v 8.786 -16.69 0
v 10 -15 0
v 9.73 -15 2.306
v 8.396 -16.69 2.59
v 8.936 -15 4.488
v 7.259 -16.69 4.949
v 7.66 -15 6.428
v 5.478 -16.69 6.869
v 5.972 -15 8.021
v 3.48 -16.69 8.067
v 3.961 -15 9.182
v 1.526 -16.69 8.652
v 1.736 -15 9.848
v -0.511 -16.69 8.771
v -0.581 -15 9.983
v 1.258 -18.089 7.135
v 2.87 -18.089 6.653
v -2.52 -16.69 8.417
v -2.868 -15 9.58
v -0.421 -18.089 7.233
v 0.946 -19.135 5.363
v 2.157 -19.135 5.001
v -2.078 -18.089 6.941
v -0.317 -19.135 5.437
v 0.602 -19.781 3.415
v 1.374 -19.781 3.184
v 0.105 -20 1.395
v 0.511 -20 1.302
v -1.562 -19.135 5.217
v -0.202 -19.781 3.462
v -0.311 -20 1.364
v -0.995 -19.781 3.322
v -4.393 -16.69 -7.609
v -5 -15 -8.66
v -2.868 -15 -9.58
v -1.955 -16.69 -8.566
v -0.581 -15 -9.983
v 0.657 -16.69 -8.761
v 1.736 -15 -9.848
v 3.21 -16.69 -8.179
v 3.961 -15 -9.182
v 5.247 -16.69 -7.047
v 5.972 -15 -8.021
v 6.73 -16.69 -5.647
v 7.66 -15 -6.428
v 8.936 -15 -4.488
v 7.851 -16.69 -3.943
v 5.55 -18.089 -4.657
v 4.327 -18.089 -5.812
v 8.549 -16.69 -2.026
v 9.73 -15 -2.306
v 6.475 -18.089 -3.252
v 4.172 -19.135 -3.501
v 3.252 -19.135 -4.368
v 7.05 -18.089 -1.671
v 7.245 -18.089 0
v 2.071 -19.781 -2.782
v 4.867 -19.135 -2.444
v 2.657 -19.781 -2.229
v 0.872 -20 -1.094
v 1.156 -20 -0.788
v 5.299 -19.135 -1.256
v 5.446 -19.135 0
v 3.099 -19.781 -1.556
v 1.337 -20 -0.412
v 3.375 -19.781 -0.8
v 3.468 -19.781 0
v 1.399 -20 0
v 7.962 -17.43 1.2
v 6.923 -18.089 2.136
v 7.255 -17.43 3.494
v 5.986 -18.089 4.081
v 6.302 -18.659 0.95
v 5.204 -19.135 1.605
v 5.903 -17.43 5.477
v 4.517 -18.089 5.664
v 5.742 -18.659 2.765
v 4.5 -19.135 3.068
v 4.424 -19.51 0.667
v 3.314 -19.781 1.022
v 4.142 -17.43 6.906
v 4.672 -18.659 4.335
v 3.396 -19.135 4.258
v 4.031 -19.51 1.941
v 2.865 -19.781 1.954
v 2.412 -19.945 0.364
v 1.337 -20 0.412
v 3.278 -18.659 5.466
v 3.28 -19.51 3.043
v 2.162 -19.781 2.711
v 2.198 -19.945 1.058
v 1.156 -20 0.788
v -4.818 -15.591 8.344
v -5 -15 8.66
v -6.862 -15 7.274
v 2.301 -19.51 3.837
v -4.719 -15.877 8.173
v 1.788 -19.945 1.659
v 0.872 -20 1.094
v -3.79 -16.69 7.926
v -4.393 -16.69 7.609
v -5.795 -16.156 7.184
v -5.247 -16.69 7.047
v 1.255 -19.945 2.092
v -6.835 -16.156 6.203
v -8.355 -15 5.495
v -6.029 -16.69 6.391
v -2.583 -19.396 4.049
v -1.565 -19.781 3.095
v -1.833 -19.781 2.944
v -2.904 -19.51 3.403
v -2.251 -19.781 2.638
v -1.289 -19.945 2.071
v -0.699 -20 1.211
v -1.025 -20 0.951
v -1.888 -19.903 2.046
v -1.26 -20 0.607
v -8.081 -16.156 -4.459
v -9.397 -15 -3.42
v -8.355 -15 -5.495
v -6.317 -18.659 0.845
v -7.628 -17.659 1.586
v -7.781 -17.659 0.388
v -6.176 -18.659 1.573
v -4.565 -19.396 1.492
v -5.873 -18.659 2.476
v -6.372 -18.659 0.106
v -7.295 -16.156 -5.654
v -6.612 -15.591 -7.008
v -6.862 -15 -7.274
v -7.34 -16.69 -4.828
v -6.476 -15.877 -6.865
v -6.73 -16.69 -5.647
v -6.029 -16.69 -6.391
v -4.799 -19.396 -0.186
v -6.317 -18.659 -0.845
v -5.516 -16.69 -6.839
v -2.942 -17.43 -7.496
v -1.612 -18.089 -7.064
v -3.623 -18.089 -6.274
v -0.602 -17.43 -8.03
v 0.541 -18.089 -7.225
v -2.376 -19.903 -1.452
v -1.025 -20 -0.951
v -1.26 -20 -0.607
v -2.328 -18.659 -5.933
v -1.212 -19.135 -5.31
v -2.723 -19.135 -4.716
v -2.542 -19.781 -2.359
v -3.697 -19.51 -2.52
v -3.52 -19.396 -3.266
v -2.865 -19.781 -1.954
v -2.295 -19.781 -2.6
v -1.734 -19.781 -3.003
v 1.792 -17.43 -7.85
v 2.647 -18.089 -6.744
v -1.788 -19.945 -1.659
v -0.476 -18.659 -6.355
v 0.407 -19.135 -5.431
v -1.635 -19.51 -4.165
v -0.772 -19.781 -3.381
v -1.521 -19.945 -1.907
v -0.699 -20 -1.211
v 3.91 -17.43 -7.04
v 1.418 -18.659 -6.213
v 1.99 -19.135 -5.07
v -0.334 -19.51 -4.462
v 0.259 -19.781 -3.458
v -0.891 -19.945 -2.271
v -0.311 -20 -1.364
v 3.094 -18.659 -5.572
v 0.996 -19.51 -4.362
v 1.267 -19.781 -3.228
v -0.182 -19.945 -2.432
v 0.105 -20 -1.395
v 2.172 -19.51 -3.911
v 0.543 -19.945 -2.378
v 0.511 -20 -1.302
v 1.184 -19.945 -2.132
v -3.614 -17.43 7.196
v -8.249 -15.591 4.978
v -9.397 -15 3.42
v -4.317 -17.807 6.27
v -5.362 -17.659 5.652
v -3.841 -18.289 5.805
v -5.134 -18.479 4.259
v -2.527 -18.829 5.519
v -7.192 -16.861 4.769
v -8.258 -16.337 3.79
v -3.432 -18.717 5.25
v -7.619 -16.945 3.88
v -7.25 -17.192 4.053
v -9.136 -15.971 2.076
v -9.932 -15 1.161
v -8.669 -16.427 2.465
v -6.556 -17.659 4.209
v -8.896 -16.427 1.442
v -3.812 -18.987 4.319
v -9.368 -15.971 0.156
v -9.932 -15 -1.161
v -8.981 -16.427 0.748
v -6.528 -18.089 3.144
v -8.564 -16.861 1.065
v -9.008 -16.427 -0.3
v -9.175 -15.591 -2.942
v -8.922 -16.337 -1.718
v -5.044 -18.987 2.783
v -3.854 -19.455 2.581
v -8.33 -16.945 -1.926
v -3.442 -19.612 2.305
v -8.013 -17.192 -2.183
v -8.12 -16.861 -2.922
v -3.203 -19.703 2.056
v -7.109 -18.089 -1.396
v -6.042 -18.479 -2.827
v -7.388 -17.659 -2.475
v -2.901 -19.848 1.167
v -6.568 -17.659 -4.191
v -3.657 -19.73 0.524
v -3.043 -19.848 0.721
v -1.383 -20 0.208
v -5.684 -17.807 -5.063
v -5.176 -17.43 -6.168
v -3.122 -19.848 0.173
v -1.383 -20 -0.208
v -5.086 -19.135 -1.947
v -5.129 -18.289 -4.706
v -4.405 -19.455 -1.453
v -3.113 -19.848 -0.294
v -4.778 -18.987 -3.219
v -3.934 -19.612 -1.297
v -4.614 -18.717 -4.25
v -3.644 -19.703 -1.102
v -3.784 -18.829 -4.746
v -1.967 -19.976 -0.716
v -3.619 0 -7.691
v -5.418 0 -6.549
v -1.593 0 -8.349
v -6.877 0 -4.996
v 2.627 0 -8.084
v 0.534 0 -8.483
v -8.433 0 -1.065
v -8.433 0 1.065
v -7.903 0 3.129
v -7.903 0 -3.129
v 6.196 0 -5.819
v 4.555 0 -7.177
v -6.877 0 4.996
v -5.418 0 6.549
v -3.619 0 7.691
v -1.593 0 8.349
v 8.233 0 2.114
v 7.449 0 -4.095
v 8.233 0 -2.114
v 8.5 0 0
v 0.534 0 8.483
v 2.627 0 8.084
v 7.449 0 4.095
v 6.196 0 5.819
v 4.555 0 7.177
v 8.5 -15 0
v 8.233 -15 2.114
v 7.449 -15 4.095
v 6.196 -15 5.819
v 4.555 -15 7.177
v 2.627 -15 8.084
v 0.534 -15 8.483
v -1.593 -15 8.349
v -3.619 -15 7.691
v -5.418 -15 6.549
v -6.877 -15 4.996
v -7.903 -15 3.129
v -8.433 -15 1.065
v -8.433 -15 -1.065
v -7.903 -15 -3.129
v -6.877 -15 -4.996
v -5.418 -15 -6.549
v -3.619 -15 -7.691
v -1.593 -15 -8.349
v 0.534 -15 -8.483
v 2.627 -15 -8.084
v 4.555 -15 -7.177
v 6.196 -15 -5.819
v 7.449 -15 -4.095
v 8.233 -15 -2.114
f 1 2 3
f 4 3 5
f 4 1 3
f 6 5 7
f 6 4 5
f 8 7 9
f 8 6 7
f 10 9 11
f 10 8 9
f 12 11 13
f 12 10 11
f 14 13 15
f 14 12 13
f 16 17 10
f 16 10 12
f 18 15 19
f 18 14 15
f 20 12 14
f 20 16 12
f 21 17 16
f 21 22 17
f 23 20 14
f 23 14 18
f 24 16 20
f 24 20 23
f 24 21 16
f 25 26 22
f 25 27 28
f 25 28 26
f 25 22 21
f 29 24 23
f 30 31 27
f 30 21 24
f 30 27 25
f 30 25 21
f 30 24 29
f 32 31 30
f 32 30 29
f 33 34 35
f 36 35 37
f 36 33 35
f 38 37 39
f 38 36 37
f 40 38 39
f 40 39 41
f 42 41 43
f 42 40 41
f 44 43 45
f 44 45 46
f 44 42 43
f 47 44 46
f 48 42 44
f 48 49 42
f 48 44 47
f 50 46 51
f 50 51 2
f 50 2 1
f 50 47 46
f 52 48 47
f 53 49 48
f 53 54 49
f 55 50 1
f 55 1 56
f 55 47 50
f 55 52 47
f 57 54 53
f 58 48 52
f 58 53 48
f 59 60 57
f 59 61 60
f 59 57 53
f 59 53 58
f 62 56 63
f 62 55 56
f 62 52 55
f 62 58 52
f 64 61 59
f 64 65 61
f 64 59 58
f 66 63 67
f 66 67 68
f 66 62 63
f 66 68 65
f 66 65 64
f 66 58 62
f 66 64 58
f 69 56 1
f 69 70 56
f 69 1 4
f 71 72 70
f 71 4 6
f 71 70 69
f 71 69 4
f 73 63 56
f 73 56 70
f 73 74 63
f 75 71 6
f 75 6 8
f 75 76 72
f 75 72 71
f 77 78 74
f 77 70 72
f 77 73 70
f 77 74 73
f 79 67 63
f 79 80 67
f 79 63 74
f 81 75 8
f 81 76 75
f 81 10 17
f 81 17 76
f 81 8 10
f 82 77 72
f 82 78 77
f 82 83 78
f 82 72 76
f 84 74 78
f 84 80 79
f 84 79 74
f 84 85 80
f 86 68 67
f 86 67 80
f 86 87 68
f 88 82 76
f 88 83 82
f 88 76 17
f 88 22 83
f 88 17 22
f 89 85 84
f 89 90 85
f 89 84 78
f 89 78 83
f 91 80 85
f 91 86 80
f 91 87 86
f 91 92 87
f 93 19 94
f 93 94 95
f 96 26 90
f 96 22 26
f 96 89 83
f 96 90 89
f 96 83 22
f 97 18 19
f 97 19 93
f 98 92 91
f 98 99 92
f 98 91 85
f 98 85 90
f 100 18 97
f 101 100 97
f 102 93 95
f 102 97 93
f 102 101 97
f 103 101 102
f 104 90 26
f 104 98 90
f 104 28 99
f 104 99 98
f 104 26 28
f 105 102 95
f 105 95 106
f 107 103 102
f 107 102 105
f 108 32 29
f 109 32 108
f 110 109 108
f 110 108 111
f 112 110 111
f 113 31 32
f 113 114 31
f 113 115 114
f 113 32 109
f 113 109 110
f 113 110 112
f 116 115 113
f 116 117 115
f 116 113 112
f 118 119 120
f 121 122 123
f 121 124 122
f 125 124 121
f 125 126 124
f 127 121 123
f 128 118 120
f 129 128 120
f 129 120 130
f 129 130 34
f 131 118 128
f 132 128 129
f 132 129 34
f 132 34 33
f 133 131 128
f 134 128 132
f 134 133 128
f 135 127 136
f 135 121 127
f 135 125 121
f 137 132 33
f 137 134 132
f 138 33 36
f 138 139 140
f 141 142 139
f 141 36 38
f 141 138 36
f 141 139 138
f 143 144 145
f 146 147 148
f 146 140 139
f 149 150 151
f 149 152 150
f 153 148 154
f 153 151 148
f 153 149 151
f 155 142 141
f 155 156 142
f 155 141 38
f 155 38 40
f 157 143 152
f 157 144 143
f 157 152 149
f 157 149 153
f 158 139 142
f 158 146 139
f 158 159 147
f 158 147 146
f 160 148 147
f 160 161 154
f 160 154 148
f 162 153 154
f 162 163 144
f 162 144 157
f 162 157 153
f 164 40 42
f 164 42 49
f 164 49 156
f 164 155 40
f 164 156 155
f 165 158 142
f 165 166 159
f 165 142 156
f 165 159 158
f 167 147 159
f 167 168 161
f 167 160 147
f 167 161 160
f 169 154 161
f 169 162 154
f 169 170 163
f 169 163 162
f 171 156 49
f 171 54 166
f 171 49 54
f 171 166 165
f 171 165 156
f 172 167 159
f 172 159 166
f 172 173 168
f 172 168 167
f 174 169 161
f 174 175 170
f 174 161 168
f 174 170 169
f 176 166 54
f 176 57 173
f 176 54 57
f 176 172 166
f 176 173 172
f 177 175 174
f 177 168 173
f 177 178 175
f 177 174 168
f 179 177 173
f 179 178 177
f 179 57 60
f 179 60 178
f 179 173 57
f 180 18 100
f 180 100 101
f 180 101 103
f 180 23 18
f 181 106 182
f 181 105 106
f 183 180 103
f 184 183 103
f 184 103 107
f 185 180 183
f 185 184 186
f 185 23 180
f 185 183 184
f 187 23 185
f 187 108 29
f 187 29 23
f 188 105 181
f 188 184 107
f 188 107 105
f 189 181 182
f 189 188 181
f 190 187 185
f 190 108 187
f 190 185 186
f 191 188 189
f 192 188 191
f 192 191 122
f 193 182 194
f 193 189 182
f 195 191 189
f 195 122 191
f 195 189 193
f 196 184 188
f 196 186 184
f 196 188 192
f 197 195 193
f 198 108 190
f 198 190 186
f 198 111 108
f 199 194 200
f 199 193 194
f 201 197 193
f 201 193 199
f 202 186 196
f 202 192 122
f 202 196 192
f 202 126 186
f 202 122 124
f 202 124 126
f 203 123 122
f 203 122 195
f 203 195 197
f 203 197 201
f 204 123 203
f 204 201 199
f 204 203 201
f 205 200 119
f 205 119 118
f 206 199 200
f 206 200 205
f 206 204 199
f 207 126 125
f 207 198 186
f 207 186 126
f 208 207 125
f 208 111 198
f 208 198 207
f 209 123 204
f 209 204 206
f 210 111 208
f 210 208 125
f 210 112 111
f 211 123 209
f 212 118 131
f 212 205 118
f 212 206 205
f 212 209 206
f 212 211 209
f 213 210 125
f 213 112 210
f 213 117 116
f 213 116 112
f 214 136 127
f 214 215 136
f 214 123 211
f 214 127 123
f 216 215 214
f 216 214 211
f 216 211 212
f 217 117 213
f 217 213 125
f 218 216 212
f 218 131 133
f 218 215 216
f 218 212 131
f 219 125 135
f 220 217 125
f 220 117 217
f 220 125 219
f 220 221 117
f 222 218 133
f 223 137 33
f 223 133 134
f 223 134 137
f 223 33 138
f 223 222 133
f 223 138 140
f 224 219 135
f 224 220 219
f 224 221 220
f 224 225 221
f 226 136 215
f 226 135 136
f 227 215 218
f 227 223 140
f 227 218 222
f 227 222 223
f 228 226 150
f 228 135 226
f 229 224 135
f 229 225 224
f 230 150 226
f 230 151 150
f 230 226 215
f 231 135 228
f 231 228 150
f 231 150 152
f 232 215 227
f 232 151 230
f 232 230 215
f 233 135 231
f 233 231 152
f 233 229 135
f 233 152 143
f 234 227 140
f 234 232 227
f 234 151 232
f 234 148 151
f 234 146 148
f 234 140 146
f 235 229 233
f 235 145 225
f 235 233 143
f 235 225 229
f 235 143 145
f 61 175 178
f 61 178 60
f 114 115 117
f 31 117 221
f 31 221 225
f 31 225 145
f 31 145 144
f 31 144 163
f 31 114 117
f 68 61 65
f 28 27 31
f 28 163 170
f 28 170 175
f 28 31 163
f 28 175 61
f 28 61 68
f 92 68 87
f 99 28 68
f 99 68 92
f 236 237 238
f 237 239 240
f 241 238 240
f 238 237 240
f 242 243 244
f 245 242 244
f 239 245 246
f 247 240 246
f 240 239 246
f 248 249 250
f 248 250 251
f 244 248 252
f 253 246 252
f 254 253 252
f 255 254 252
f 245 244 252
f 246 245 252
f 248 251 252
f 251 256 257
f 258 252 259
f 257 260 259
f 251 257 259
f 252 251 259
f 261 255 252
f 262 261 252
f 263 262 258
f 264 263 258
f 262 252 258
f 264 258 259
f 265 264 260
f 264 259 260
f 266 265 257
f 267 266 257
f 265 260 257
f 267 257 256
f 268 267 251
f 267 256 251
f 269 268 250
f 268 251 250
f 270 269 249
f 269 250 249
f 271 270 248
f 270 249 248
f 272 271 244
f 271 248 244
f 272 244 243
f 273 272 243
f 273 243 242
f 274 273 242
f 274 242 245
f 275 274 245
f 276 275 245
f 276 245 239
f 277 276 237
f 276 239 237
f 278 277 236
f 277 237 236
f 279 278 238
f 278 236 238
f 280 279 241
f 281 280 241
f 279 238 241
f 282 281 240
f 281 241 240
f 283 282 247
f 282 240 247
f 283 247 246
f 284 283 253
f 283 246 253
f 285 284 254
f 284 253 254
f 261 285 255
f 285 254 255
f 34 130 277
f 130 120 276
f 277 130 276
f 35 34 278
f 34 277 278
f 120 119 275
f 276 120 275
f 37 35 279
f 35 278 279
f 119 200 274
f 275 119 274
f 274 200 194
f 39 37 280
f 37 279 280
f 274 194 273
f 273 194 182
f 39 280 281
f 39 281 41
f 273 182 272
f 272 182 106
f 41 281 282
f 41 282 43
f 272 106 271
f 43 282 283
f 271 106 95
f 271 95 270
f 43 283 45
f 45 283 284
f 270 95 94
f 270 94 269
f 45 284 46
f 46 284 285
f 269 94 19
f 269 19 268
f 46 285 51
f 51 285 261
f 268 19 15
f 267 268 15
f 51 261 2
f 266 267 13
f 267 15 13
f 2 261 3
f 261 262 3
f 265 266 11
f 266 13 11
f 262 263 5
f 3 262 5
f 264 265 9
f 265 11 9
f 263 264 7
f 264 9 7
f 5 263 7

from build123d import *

# Parameters (mm, degrees)
F0_R     = 8.5
F1_DEPTH = 15
F2_R     = 10
F3_DEPTH = 5


# Not quite as in the source:
# - a fillet or chamfer that OpenCascade refuses, or shapes differently, is made with other operations: its cross-section is extruded or revolved along the edge and cut away or added


with BuildPart() as f1:
    # F0 (on Front) → F1 (new body)
    with BuildSketch(Plane.XZ):
        Circle(F0_R)
    extrude(amount=F1_DEPTH)

    # F2 (on face) → F3 (join)
    with BuildSketch(Plane.XZ.offset(15)):
        Circle(F2_R)
    extrude(amount=F3_DEPTH)

    # F4: fillet of radius 9.8982756057 on 1 edges, made by hand

    # F4_s1 → F4_t2 (revolve, cut)
    with BuildSketch(Plane.XY):
        with BuildLine():
            ThreePointArc((10, -15), (6.3731809715, -18.6591872749), (1.3986770752, -20))
            Line((1.3986770752, -20), (10, -20))
            Line((10, -20), (10, -15))
        make_face()
    revolve(axis=Axis((0, -20, 0), (0, -1, 0)), mode=Mode.SUBTRACT)


solid = f1.part
